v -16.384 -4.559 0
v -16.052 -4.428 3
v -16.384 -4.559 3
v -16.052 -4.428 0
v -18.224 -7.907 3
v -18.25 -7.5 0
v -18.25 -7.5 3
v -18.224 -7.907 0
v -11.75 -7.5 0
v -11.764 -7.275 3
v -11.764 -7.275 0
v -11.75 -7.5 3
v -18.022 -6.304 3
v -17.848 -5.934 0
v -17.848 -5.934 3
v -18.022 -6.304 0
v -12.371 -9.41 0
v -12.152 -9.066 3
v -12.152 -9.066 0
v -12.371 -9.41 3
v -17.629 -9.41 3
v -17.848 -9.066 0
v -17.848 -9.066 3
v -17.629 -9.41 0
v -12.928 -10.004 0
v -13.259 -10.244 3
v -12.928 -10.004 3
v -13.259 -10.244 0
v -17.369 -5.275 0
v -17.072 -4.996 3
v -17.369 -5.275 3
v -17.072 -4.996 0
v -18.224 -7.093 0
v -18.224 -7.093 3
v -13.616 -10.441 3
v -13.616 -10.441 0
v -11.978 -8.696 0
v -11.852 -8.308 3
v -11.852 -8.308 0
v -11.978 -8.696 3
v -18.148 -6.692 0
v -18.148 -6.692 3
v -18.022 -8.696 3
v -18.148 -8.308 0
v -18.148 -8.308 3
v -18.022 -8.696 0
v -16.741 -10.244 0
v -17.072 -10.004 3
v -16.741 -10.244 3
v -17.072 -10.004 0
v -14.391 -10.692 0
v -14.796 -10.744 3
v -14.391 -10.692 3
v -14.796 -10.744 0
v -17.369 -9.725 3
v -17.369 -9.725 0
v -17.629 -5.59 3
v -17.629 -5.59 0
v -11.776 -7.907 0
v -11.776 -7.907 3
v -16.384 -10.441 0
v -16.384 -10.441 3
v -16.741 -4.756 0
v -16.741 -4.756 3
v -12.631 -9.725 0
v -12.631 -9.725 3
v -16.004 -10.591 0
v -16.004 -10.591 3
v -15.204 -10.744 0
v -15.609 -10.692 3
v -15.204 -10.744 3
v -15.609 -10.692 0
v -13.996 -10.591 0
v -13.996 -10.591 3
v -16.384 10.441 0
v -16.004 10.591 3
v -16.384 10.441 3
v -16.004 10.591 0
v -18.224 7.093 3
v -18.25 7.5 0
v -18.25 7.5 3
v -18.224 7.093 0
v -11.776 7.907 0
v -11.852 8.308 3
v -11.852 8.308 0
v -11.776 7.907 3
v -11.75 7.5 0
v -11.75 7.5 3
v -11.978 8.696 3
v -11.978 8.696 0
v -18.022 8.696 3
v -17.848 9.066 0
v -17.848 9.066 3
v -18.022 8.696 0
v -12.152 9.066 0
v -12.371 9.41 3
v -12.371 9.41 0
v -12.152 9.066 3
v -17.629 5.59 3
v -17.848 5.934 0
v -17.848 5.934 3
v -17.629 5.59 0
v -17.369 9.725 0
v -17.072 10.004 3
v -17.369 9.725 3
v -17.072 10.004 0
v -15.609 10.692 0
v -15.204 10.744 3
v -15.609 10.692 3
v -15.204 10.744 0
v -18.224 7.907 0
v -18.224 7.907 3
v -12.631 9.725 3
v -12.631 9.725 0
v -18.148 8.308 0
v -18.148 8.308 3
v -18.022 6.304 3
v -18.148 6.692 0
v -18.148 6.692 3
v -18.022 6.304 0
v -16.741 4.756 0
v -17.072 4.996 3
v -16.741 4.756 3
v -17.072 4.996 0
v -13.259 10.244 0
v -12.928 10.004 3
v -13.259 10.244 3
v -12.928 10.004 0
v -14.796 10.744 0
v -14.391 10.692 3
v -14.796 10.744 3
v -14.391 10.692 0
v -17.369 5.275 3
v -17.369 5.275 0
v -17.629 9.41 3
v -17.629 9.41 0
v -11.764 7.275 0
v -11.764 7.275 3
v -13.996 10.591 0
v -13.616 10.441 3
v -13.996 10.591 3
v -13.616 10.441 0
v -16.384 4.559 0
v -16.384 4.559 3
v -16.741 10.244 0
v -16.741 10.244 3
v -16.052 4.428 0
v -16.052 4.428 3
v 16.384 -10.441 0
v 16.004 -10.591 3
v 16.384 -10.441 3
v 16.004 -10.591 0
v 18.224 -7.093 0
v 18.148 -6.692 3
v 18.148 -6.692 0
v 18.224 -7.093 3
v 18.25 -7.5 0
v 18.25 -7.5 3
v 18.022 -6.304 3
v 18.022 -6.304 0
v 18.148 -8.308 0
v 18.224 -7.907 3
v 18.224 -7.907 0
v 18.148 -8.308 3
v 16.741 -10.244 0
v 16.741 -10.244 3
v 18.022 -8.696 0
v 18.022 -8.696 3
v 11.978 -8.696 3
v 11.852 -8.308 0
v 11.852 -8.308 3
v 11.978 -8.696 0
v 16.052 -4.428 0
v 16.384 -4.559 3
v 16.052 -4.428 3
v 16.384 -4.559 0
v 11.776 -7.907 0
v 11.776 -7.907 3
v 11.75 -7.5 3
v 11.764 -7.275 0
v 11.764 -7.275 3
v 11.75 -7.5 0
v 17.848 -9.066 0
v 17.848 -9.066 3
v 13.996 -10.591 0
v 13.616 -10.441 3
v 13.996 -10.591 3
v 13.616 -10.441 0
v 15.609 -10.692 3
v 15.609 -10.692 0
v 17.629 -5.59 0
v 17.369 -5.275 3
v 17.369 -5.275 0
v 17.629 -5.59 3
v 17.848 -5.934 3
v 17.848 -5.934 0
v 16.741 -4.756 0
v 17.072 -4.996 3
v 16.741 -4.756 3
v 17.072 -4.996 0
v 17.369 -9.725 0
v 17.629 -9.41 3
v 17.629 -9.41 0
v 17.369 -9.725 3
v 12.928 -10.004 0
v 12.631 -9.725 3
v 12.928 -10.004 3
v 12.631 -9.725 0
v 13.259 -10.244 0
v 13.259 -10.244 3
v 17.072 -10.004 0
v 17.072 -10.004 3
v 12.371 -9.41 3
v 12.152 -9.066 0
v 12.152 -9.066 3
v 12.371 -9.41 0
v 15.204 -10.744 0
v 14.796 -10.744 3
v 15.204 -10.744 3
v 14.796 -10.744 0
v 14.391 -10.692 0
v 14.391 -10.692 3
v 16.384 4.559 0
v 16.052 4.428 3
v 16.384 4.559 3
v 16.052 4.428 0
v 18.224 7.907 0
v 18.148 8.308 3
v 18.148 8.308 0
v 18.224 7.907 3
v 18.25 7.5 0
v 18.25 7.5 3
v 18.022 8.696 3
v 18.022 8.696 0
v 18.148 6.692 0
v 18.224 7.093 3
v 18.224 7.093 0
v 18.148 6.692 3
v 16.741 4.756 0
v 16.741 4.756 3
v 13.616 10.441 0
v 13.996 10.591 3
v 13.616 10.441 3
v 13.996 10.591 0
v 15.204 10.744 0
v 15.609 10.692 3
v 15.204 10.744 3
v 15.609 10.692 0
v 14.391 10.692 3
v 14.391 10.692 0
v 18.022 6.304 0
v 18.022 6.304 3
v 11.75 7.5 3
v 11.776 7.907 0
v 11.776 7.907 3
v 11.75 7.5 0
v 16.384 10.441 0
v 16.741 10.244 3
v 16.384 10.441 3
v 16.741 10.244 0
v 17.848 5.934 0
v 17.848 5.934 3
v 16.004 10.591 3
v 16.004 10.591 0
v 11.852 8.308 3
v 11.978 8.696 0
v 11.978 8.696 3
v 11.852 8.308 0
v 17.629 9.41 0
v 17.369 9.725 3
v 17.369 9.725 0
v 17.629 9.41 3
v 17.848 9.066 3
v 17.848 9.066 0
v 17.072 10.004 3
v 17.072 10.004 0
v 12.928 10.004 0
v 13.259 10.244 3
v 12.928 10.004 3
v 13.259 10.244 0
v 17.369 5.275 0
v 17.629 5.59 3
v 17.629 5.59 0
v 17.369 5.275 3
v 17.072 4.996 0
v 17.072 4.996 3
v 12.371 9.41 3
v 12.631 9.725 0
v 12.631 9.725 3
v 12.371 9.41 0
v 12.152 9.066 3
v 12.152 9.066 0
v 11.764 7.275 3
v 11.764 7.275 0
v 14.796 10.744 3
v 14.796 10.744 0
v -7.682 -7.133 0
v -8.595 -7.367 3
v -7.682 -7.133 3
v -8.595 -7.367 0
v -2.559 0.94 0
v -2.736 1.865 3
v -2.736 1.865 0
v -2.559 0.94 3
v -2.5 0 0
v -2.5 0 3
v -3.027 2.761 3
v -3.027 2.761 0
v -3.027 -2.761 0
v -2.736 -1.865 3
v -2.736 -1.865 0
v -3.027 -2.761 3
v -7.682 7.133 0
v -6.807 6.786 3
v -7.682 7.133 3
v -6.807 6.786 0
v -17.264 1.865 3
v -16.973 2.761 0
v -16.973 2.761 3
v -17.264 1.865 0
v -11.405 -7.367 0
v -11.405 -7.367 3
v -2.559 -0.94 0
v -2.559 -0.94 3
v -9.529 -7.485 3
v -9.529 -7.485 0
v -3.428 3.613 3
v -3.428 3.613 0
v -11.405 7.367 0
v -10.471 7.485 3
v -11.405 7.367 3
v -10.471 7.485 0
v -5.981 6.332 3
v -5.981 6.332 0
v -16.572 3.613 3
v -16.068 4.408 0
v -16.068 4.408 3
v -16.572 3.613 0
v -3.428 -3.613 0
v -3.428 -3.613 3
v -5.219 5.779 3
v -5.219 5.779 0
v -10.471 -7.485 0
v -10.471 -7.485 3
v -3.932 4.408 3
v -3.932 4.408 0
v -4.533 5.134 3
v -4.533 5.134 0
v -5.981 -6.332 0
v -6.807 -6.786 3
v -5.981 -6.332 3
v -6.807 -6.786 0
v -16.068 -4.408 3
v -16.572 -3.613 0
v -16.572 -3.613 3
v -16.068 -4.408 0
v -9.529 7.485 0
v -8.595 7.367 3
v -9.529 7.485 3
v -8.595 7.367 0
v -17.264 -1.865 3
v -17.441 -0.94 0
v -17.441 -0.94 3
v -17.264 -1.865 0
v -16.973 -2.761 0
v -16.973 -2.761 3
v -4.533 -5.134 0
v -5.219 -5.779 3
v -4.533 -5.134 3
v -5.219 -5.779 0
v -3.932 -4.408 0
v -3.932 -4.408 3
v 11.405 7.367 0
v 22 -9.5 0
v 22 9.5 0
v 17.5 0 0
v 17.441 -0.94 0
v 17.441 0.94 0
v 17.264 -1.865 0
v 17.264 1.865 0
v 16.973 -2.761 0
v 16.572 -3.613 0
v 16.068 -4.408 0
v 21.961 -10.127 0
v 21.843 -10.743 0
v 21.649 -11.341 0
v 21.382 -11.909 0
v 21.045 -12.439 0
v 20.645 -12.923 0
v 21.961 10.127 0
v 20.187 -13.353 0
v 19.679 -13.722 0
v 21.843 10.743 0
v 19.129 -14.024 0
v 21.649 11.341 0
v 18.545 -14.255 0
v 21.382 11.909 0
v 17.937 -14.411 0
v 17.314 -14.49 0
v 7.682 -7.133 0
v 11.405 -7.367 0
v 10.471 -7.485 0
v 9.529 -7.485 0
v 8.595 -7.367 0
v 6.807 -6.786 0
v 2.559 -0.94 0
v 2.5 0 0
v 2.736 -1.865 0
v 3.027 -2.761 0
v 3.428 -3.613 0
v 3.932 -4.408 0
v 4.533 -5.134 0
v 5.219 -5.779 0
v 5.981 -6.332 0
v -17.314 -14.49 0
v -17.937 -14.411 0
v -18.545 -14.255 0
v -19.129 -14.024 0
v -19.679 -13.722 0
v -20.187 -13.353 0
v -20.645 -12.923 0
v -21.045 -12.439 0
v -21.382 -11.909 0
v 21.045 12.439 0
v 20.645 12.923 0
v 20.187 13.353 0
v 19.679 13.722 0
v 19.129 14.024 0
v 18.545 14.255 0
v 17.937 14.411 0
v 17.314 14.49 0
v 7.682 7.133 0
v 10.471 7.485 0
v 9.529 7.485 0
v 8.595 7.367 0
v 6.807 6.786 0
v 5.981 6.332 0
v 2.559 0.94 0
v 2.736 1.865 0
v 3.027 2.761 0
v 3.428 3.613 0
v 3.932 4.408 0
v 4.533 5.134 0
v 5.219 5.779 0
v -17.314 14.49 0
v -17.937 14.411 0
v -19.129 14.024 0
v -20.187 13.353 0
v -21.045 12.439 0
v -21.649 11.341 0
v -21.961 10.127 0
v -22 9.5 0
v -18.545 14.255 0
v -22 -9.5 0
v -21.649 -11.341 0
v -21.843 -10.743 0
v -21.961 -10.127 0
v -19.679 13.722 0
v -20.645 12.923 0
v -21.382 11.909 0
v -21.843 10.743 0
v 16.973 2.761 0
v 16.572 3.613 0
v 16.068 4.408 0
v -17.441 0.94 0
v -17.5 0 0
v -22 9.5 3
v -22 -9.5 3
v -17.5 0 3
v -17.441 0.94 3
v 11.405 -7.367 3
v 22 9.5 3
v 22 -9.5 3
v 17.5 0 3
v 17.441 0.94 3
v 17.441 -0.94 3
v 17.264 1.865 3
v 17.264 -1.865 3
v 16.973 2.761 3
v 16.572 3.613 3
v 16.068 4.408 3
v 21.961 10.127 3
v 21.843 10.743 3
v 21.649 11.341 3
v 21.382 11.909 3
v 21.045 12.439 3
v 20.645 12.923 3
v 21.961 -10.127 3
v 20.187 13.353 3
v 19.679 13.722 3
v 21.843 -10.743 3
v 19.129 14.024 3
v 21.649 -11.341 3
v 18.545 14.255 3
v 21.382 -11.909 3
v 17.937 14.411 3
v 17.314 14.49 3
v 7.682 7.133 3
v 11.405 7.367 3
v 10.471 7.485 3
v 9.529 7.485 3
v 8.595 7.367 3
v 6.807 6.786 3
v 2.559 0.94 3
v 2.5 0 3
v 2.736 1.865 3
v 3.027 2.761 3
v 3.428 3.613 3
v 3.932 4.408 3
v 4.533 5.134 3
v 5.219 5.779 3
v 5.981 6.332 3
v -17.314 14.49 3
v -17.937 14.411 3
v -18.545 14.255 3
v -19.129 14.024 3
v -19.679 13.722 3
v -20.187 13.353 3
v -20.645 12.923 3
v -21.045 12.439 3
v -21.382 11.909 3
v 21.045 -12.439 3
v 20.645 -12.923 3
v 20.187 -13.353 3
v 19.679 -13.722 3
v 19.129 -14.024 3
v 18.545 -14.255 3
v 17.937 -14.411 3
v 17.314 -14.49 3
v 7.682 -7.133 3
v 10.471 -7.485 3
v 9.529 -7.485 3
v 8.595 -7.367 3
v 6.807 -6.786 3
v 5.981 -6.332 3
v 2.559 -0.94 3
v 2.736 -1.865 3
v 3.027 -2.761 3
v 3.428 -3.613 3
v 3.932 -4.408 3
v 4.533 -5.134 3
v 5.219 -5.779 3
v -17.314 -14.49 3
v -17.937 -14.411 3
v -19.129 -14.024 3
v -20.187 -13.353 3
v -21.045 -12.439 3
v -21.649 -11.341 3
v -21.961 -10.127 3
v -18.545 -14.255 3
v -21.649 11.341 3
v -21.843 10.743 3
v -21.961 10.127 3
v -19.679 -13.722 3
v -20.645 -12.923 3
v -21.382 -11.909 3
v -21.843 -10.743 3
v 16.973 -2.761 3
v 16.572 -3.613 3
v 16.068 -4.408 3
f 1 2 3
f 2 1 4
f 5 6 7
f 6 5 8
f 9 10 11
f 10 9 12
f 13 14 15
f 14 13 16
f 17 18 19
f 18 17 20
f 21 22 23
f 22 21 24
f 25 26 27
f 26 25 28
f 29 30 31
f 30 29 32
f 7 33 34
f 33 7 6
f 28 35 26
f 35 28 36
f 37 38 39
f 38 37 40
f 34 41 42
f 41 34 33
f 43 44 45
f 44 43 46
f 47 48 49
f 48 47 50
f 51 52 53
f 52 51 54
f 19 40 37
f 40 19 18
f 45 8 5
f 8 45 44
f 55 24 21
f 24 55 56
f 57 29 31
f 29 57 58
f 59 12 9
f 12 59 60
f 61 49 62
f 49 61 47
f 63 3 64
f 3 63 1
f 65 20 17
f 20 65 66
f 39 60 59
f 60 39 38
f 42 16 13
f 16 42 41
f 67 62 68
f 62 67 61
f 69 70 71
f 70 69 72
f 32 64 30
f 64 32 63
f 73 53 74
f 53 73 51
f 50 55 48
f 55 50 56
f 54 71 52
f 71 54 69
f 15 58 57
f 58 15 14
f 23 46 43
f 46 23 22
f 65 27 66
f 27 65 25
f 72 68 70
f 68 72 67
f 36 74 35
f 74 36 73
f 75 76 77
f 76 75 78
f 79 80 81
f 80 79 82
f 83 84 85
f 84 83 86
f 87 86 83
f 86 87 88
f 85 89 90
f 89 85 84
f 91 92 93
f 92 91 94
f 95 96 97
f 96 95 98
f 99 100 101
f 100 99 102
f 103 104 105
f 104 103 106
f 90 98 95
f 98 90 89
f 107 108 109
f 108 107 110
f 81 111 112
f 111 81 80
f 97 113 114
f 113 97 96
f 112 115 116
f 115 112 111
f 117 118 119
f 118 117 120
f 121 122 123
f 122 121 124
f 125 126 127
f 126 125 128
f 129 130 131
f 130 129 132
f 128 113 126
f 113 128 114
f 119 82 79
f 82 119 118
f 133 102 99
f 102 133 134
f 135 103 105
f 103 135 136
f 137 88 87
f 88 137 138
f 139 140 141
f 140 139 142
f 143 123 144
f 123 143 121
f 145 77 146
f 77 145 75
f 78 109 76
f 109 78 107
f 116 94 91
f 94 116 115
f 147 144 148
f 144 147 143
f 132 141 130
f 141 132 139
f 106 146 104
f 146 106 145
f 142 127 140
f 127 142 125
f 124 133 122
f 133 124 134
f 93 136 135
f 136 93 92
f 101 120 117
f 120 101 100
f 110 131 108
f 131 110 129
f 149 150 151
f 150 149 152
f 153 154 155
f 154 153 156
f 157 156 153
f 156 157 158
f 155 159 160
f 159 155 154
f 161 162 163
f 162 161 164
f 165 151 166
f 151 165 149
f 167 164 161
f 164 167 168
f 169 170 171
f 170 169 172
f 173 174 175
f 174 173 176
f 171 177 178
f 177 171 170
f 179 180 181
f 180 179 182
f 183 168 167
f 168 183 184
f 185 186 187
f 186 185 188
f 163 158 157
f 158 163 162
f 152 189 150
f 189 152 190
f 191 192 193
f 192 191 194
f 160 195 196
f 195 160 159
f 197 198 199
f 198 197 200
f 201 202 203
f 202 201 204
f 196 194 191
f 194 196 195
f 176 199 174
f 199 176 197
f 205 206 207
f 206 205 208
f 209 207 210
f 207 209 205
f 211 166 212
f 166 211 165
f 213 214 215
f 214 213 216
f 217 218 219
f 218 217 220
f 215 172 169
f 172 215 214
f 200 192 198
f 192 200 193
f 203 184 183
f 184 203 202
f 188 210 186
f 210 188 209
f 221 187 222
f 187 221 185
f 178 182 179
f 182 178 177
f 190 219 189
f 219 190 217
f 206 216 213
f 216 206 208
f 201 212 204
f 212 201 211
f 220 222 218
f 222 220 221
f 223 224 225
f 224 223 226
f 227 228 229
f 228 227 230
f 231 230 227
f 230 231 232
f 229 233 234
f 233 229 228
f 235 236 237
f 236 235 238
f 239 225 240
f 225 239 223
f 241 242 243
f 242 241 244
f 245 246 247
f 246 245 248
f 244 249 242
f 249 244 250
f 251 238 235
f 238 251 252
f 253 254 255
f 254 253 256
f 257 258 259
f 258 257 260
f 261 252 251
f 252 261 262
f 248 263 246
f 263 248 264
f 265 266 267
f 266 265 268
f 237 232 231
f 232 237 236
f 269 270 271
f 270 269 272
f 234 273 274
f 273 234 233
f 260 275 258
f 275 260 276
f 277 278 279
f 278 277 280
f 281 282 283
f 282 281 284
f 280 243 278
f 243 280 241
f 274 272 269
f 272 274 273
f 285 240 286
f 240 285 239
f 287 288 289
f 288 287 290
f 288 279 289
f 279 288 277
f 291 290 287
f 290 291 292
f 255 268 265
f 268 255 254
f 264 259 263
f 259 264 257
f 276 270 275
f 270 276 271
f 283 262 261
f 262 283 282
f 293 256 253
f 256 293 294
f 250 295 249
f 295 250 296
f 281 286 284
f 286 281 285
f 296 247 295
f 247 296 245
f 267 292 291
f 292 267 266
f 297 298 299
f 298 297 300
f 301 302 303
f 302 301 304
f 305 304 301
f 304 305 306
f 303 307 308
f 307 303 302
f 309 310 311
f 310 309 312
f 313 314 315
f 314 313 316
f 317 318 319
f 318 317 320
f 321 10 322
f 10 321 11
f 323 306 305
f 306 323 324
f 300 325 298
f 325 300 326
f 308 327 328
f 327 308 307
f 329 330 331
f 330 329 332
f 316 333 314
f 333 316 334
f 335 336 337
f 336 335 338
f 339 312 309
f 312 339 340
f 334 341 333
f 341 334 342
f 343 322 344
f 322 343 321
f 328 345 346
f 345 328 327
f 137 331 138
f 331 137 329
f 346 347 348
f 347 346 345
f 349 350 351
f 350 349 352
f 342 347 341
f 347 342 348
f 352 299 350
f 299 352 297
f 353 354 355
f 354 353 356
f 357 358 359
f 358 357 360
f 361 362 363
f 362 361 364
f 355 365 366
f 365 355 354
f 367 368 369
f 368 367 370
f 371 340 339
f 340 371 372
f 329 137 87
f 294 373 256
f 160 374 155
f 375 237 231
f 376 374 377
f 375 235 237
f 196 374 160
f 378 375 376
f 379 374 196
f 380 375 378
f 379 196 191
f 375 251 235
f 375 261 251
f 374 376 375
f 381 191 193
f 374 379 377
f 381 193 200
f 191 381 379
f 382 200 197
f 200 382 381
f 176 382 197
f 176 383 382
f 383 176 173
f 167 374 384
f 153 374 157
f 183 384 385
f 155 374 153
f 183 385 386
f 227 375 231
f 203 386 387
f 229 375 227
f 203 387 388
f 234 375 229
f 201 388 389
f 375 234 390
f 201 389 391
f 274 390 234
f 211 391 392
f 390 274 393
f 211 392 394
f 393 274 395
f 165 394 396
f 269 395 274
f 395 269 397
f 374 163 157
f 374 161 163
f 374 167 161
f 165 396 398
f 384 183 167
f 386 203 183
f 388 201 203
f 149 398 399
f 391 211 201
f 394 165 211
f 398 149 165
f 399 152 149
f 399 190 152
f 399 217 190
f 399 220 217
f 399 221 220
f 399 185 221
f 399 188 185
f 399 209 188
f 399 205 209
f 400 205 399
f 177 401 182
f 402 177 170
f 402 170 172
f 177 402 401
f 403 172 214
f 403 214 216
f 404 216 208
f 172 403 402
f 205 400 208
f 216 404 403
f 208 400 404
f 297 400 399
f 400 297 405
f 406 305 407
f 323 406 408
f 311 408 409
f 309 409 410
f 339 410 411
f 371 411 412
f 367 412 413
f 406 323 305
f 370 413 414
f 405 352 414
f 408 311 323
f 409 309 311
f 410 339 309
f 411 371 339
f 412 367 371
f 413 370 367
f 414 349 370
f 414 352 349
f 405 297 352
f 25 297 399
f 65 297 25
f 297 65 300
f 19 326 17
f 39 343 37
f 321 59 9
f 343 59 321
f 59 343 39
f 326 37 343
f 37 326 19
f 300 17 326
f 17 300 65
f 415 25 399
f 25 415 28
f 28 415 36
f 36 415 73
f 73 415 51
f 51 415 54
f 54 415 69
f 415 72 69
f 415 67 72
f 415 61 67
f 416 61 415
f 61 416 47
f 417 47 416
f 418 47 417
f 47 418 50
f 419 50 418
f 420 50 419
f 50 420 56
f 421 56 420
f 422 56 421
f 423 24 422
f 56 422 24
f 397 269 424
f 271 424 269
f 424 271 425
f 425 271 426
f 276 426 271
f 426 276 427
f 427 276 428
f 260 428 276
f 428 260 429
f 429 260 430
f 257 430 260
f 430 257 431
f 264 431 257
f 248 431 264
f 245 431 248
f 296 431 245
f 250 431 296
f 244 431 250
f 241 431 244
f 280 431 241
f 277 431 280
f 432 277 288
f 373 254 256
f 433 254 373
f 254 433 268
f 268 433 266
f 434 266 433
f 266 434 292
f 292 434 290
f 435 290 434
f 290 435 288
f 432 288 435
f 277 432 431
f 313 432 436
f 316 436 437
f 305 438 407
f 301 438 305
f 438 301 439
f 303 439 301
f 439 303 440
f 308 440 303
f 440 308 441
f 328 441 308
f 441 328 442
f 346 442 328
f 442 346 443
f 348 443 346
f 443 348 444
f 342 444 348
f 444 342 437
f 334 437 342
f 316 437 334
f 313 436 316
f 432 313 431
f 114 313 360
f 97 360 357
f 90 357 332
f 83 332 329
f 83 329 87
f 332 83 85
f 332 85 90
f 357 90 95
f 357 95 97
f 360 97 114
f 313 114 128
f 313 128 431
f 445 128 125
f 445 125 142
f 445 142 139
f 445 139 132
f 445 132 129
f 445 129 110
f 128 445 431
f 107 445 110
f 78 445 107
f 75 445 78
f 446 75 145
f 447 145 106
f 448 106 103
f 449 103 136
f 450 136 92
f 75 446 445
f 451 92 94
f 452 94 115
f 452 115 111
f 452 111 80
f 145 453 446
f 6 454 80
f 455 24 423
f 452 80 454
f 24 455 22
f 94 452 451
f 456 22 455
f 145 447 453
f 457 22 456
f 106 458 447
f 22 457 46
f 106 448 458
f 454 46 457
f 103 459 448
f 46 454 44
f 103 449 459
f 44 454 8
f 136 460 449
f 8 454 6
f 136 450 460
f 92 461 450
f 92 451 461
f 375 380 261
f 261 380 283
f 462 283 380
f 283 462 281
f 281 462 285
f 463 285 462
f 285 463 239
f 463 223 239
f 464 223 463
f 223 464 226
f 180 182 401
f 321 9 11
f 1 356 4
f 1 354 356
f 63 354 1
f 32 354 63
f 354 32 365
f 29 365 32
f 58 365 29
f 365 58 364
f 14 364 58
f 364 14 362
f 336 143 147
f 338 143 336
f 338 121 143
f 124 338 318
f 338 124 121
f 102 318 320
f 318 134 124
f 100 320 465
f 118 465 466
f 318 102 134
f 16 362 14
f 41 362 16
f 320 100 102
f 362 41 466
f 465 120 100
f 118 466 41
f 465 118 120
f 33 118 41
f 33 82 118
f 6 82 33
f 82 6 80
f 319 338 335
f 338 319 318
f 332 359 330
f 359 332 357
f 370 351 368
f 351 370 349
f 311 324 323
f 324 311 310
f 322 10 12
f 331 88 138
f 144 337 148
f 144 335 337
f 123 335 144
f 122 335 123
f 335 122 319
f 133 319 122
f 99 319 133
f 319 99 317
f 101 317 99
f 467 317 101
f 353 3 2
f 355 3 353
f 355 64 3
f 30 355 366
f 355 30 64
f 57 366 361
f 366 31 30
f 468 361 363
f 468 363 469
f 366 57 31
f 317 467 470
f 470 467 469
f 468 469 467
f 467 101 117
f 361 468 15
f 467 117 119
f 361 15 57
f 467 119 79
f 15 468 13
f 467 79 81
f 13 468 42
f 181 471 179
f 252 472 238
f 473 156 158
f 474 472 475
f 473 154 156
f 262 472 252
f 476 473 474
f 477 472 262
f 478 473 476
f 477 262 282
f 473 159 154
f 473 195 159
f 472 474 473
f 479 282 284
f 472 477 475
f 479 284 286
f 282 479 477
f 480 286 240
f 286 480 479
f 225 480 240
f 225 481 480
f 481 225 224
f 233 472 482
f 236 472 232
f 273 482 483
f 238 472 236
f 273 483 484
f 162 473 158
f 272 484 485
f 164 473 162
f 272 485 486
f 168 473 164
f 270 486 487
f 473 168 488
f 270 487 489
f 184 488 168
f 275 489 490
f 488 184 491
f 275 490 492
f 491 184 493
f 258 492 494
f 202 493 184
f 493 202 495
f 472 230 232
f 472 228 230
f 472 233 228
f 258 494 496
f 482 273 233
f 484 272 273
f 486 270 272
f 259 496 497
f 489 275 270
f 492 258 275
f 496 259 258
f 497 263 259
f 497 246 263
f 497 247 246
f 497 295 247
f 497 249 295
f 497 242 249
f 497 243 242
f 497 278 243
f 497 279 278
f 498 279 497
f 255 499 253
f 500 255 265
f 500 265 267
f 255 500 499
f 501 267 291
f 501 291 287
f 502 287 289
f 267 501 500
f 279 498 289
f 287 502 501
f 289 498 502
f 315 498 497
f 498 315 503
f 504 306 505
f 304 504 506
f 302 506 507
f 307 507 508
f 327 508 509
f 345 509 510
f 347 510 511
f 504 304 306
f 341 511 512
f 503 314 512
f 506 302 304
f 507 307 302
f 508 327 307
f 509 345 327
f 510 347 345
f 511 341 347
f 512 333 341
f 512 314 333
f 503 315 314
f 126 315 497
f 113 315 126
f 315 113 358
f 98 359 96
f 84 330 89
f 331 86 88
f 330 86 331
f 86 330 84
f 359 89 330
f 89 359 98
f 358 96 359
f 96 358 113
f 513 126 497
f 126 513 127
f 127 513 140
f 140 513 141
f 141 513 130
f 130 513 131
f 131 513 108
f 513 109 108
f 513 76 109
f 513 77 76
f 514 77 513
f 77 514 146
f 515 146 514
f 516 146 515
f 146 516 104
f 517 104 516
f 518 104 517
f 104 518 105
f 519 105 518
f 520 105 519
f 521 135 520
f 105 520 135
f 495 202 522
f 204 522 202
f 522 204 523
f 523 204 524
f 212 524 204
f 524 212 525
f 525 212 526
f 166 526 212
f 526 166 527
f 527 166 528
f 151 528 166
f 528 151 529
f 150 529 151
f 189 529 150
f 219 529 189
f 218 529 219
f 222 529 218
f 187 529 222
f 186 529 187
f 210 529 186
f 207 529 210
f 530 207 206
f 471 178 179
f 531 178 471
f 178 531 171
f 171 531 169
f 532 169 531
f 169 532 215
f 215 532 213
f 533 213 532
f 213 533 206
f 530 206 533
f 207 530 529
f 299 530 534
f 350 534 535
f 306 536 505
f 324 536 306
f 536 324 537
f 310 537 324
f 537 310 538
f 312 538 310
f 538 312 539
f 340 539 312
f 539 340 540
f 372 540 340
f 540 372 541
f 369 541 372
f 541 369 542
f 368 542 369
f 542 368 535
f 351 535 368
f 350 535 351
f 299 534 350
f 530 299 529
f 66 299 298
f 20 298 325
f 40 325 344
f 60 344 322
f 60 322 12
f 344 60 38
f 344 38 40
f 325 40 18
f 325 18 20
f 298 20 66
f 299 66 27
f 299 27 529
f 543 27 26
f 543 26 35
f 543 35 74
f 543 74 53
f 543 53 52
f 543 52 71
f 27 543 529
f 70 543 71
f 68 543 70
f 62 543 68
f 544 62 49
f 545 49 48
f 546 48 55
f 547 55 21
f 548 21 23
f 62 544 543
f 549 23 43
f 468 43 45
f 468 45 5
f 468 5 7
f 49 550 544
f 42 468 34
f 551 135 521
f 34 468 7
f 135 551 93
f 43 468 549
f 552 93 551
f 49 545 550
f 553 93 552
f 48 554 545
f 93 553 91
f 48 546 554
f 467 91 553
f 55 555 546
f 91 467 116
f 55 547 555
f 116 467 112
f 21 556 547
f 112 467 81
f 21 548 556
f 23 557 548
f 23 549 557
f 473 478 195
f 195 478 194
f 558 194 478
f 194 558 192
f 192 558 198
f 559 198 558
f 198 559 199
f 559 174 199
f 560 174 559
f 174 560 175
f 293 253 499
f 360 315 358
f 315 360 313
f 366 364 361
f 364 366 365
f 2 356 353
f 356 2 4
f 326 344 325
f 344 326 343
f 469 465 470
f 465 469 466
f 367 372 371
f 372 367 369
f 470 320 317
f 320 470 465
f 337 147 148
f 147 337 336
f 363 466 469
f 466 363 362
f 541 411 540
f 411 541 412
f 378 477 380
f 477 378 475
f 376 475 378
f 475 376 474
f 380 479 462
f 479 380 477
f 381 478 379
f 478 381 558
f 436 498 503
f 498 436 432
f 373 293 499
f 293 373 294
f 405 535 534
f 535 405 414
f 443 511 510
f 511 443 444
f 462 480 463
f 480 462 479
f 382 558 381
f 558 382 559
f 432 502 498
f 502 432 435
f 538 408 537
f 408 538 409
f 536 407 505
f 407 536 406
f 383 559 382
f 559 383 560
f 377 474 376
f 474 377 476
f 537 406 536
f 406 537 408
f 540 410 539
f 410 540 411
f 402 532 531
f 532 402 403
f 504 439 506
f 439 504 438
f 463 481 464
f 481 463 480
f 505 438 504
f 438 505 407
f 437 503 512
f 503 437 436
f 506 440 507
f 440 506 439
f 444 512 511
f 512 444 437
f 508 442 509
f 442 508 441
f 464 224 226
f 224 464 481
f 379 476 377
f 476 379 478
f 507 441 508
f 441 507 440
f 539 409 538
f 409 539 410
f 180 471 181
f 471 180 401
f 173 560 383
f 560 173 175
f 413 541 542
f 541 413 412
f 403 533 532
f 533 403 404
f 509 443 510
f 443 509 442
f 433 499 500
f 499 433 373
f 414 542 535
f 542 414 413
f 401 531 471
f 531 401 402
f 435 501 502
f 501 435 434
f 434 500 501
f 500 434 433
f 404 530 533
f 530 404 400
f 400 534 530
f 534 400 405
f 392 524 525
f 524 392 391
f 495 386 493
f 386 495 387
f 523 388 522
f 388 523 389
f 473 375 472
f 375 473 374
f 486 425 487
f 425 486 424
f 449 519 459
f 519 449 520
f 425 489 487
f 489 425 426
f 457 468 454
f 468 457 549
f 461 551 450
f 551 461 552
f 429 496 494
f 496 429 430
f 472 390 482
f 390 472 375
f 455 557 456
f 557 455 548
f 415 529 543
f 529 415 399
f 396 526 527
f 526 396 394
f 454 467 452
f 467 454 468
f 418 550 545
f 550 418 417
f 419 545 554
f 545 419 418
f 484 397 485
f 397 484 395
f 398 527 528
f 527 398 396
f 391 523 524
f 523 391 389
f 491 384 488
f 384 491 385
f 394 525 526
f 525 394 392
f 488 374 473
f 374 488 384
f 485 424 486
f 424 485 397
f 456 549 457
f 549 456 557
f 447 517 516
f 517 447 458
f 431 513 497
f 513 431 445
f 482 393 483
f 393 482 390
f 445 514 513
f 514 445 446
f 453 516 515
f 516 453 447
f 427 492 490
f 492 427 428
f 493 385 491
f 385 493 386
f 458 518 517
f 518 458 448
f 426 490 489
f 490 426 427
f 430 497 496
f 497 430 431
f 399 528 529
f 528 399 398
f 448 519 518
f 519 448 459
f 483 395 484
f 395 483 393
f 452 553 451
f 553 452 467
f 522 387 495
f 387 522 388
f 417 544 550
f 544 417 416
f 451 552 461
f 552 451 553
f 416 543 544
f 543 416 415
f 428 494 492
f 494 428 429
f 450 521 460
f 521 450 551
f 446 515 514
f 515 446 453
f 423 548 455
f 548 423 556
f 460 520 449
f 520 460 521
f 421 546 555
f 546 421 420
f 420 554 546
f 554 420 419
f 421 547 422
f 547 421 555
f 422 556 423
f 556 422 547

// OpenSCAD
$fn = 50;

difference() {
	union() {
		hull() {
			translate(v = [-17.0, 9.5, 0]) {
				cylinder(h = 3, r = 5);
			}
			translate(v = [17.0, 9.5, 0]) {
				cylinder(h = 3, r = 5);
			}
			translate(v = [-17.0, -9.5, 0]) {
				cylinder(h = 3, r = 5);
			}
			translate(v = [17.0, -9.5, 0]) {
				cylinder(h = 3, r = 5);
			}
		}
	}
	union() {
		translate(v = [-15.0, -7.5, -100.0]) {
			cylinder(h = 200, r = 3.25);
		}
		translate(v = [-15.0, 7.5, -100.0]) {
			cylinder(h = 200, r = 3.25);
		}
		translate(v = [15.0, -7.5, -100.0]) {
			cylinder(h = 200, r = 3.25);
		}
		translate(v = [15.0, 7.5, -100.0]) {
			cylinder(h = 200, r = 3.25);
		}
		translate(v = [-15.0, -7.5, -100.0]) {
			cylinder(h = 200, r = 1.8);
		}
		translate(v = [-15.0, 7.5, -100.0]) {
			cylinder(h = 200, r = 1.8);
		}
		translate(v = [15.0, -7.5, -100.0]) {
			cylinder(h = 200, r = 1.8);
		}
		translate(v = [15.0, 7.5, -100.0]) {
			cylinder(h = 200, r = 1.8);
		}
		translate(v = [-10.0, 0, 0.0]) {
			cylinder(h = 3, r = 7.5);
		}
		translate(v = [10.0, 0, 0.0]) {
			cylinder(h = 3, r = 7.5);
		}
	}
}
